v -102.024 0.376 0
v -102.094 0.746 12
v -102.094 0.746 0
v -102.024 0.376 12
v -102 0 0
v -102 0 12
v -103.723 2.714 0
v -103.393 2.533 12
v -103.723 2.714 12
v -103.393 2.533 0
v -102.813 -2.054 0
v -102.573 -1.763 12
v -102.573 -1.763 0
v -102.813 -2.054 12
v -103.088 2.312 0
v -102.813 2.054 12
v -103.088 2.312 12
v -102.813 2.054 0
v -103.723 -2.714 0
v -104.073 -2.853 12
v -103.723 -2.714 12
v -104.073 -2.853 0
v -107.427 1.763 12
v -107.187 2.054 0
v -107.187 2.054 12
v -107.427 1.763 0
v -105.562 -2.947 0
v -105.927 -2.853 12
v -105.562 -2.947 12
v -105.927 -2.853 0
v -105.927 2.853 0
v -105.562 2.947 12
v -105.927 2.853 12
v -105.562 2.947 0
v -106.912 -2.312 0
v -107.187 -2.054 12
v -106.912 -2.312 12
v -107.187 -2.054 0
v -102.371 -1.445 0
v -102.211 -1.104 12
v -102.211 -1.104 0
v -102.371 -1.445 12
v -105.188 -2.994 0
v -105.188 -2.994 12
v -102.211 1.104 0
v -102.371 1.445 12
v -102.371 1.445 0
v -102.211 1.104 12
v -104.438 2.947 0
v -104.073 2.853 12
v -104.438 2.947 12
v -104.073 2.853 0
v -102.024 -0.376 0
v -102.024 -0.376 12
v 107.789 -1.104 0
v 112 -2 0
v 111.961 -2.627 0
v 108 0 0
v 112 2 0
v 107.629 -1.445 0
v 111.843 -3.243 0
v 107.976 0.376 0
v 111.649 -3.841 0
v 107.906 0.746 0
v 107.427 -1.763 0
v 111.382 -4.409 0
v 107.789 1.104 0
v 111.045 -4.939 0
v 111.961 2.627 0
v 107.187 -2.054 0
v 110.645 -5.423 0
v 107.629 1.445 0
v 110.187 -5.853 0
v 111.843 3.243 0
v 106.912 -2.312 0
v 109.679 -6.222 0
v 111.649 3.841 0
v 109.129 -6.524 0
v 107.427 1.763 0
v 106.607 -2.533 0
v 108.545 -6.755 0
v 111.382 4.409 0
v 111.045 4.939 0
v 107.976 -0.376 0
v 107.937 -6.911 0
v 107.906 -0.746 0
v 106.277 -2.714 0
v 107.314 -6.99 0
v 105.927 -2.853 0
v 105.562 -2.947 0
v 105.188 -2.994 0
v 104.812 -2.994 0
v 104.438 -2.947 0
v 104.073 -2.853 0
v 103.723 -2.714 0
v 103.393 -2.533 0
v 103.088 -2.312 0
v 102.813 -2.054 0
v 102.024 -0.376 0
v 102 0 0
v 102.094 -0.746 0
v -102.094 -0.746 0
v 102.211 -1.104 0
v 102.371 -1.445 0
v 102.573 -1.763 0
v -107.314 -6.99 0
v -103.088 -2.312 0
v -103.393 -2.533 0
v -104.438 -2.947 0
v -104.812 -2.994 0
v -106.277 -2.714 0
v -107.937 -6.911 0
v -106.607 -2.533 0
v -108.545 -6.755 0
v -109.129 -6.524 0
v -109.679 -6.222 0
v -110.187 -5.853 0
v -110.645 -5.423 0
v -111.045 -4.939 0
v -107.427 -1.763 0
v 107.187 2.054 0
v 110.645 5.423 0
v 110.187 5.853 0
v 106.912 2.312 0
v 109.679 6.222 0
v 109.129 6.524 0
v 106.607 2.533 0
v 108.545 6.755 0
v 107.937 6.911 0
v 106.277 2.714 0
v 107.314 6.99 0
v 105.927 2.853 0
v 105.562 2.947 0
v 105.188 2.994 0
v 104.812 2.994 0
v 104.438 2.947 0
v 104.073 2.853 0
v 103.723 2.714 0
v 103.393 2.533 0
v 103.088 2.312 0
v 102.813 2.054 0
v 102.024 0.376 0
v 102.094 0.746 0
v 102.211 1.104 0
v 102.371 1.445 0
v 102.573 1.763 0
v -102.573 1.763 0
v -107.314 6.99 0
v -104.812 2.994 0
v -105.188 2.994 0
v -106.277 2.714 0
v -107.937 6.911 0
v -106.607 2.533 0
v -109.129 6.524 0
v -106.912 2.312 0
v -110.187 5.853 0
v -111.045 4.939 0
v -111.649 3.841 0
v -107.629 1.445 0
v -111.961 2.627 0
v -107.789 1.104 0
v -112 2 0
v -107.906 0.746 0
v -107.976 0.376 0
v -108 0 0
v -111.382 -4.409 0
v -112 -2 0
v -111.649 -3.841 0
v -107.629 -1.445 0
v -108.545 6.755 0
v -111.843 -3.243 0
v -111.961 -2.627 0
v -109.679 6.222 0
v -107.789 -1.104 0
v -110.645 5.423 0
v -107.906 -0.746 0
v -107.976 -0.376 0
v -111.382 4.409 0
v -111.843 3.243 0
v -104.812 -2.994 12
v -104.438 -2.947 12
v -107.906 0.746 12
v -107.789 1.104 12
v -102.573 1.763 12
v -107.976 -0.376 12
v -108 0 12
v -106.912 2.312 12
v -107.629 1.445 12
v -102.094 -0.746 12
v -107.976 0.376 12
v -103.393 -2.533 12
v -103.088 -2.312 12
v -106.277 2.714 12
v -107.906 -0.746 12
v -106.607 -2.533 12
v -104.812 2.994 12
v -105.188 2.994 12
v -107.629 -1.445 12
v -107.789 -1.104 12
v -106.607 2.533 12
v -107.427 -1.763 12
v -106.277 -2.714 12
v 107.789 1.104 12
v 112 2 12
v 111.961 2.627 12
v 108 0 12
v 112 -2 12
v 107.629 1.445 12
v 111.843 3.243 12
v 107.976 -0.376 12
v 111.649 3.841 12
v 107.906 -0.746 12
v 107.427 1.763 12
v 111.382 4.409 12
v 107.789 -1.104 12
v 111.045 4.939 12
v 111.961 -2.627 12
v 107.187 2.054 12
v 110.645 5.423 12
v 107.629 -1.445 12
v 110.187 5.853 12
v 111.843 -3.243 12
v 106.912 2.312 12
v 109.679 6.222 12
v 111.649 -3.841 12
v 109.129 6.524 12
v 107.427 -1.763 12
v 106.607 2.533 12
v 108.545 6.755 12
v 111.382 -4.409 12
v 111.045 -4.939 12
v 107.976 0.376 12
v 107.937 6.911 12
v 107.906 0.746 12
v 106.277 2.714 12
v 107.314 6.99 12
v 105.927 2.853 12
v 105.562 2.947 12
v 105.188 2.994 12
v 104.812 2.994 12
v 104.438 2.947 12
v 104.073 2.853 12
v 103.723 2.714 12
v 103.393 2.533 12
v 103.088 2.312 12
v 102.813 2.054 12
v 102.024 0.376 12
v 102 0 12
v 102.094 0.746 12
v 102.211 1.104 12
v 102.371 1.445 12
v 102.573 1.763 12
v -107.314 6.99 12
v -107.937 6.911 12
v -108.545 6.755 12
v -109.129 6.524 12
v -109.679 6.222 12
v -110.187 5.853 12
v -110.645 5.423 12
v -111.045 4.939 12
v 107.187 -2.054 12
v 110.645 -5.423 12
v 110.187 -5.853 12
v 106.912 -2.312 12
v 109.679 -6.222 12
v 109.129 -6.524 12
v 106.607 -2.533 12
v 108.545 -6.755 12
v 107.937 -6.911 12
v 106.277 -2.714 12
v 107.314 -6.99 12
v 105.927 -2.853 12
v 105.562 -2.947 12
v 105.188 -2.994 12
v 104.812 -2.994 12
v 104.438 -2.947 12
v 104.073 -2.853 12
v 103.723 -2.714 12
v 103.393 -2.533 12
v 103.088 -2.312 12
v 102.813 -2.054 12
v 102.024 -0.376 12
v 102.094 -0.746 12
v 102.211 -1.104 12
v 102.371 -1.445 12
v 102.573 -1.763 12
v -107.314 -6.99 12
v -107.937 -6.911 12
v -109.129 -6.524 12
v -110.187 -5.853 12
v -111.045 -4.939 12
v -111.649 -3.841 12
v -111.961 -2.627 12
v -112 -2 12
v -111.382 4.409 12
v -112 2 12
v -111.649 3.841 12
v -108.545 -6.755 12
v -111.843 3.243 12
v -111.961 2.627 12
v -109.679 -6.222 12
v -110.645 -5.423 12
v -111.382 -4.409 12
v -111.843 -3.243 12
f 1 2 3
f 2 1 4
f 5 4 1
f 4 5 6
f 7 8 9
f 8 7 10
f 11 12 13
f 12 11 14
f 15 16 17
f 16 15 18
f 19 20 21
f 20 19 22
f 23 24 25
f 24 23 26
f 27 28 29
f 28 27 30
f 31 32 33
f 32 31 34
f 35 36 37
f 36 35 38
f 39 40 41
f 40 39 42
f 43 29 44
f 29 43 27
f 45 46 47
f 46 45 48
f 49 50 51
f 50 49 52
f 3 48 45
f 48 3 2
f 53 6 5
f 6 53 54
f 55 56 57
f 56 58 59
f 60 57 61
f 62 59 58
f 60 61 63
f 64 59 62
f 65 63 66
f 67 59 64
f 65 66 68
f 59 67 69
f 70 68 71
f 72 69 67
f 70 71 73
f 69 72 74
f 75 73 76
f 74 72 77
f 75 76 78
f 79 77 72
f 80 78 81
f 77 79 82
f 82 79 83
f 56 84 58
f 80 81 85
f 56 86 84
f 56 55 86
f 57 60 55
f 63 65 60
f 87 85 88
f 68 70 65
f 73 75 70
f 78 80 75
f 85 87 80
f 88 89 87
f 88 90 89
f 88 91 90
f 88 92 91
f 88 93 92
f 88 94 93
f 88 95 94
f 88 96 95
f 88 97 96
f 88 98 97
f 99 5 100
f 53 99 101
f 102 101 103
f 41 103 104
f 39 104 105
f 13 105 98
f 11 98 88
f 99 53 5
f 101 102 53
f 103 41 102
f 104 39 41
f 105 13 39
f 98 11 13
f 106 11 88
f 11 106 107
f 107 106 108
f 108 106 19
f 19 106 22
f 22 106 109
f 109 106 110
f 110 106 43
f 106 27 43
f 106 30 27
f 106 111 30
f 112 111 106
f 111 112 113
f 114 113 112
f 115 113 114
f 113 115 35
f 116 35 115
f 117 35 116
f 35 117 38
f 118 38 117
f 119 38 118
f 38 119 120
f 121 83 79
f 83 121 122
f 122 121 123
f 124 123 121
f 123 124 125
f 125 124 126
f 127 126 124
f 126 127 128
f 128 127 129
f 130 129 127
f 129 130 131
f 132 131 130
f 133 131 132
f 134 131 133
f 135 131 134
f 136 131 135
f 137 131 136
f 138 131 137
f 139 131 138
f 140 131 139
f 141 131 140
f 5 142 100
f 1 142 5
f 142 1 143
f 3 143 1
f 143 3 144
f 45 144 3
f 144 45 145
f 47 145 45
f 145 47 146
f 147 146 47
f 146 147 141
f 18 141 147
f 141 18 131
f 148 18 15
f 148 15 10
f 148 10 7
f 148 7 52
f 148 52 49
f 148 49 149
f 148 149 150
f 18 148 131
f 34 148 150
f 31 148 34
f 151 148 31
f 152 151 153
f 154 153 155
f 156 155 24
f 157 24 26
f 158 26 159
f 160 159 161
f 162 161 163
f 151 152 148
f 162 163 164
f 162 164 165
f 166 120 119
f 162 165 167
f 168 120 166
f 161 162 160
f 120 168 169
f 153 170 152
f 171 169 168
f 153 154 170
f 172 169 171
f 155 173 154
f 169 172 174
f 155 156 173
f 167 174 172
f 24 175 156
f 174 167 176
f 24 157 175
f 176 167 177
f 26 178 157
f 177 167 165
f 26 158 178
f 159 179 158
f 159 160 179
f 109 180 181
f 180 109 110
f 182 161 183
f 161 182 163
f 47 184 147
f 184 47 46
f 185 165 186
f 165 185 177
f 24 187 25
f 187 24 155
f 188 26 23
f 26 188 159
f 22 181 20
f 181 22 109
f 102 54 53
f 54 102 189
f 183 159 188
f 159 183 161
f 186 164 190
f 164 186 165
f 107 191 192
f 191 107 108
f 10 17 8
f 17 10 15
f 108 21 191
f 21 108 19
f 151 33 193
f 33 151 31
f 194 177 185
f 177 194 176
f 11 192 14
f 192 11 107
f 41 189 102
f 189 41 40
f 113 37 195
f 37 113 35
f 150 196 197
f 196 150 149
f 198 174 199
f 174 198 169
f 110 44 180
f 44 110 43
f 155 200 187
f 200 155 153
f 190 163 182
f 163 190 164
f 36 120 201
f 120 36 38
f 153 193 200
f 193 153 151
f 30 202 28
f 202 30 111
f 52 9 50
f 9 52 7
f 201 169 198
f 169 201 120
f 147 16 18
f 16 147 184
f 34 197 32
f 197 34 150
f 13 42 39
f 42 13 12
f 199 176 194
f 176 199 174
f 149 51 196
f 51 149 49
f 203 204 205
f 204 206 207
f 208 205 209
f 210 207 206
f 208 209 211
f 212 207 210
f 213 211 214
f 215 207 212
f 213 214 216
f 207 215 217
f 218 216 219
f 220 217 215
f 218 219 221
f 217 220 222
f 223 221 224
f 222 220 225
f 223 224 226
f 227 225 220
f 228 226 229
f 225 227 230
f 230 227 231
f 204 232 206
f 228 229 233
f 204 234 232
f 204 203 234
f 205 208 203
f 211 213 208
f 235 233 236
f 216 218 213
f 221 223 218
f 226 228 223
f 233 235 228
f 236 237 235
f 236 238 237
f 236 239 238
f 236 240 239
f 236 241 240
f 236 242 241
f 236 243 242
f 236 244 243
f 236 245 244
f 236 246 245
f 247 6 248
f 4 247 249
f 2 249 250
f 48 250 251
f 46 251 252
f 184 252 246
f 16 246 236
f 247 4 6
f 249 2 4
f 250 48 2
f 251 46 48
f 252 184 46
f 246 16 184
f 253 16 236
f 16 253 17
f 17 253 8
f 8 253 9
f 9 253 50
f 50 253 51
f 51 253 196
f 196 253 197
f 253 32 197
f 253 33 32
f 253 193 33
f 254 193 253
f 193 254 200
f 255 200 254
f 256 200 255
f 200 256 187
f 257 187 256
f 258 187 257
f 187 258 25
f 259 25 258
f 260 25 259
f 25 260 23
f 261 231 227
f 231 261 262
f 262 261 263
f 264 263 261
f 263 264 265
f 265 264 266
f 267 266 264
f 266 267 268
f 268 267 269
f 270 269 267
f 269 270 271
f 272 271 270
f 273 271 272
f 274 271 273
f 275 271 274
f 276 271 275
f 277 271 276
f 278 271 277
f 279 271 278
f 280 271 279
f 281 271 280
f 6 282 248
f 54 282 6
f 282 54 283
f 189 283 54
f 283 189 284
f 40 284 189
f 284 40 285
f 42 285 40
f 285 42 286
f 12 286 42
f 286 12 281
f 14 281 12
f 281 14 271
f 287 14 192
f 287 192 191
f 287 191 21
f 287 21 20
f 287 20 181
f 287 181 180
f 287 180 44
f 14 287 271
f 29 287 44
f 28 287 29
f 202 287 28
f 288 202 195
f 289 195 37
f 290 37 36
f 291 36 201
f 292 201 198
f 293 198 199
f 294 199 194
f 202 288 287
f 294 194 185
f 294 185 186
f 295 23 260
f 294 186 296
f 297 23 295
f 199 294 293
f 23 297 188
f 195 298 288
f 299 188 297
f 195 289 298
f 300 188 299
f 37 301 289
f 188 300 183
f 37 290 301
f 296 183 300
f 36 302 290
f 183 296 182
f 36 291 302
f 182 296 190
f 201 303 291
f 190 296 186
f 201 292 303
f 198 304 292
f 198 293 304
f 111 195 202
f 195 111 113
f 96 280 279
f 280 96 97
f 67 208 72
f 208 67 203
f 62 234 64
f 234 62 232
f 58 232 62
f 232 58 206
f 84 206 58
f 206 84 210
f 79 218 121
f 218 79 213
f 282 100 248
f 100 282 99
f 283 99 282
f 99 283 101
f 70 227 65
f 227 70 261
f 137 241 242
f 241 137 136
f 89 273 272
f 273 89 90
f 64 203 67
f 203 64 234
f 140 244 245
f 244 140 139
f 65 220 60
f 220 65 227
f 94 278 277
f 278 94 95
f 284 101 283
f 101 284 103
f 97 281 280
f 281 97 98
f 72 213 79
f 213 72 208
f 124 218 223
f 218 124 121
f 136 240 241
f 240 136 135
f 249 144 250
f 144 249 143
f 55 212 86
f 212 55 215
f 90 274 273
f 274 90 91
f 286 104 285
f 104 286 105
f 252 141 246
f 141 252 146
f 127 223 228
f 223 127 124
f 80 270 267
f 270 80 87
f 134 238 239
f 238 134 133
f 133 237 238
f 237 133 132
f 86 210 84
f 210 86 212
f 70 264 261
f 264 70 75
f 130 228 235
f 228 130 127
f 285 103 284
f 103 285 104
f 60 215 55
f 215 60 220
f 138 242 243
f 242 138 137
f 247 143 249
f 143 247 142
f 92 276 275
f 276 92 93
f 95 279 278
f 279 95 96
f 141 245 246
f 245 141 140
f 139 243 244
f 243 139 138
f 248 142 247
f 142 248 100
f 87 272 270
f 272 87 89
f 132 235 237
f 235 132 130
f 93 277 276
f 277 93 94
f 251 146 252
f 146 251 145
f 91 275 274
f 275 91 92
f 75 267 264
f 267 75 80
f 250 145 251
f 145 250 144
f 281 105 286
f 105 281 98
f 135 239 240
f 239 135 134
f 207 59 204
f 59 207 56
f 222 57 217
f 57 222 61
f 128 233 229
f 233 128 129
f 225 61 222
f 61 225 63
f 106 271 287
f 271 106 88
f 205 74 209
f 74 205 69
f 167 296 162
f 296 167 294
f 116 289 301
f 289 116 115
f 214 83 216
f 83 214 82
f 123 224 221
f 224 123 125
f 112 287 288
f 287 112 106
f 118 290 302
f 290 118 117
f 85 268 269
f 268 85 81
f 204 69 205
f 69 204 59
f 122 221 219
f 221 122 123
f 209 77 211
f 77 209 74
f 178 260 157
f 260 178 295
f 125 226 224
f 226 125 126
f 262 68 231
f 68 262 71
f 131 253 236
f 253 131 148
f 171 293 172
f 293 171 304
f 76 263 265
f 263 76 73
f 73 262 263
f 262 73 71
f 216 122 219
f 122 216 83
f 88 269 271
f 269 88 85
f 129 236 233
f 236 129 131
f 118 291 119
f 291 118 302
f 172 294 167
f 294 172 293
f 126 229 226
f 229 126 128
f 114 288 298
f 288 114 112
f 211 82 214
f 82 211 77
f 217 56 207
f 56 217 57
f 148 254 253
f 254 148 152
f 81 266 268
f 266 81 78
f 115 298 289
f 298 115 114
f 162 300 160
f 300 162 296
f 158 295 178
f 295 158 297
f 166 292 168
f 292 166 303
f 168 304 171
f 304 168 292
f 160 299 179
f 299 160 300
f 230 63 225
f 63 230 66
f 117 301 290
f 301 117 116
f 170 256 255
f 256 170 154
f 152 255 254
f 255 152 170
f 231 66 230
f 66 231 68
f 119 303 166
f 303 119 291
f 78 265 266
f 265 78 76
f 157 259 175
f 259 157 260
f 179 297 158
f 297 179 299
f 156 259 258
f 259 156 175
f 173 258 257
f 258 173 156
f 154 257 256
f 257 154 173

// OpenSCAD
$fn = 50;


difference() {
	union() {
		hull() {
			translate(v = [-107.0000000000, 2.0000000000, 0]) {
				cylinder(h = 12, r = 5);
			}
			translate(v = [107.0000000000, 2.0000000000, 0]) {
				cylinder(h = 12, r = 5);
			}
			translate(v = [-107.0000000000, -2.0000000000, 0]) {
				cylinder(h = 12, r = 5);
			}
			translate(v = [107.0000000000, -2.0000000000, 0]) {
				cylinder(h = 12, r = 5);
			}
		}
	}
	union() {
		translate(v = [-105.0000000000, 0.0000000000, 0]) {
			cylinder(h = 12, r = 3.0000000000);
		}
		translate(v = [105.0000000000, 0.0000000000, 0]) {
			cylinder(h = 12, r = 3.0000000000);
		}
		translate(v = [-105.0000000000, 0.0000000000, 0]) {
			cylinder(h = 12, r = 1.5000000000);
		}
		translate(v = [105.0000000000, 0.0000000000, 0]) {
			cylinder(h = 12, r = 1.5000000000);
		}
		translate(v = [-105.0000000000, 0.0000000000, 0]) {
			cylinder(h = 12, r = 1.5000000000);
		}
		translate(v = [105.0000000000, 0.0000000000, 0]) {
			cylinder(h = 12, r = 1.5000000000);
		}
		translate(v = [-105.0000000000, 0.0000000000, 0]) {
			cylinder(h = 12, r = 1.5000000000);
		}
		translate(v = [105.0000000000, 0.0000000000, 0]) {
			cylinder(h = 12, r = 1.5000000000);
		}
	}
}
